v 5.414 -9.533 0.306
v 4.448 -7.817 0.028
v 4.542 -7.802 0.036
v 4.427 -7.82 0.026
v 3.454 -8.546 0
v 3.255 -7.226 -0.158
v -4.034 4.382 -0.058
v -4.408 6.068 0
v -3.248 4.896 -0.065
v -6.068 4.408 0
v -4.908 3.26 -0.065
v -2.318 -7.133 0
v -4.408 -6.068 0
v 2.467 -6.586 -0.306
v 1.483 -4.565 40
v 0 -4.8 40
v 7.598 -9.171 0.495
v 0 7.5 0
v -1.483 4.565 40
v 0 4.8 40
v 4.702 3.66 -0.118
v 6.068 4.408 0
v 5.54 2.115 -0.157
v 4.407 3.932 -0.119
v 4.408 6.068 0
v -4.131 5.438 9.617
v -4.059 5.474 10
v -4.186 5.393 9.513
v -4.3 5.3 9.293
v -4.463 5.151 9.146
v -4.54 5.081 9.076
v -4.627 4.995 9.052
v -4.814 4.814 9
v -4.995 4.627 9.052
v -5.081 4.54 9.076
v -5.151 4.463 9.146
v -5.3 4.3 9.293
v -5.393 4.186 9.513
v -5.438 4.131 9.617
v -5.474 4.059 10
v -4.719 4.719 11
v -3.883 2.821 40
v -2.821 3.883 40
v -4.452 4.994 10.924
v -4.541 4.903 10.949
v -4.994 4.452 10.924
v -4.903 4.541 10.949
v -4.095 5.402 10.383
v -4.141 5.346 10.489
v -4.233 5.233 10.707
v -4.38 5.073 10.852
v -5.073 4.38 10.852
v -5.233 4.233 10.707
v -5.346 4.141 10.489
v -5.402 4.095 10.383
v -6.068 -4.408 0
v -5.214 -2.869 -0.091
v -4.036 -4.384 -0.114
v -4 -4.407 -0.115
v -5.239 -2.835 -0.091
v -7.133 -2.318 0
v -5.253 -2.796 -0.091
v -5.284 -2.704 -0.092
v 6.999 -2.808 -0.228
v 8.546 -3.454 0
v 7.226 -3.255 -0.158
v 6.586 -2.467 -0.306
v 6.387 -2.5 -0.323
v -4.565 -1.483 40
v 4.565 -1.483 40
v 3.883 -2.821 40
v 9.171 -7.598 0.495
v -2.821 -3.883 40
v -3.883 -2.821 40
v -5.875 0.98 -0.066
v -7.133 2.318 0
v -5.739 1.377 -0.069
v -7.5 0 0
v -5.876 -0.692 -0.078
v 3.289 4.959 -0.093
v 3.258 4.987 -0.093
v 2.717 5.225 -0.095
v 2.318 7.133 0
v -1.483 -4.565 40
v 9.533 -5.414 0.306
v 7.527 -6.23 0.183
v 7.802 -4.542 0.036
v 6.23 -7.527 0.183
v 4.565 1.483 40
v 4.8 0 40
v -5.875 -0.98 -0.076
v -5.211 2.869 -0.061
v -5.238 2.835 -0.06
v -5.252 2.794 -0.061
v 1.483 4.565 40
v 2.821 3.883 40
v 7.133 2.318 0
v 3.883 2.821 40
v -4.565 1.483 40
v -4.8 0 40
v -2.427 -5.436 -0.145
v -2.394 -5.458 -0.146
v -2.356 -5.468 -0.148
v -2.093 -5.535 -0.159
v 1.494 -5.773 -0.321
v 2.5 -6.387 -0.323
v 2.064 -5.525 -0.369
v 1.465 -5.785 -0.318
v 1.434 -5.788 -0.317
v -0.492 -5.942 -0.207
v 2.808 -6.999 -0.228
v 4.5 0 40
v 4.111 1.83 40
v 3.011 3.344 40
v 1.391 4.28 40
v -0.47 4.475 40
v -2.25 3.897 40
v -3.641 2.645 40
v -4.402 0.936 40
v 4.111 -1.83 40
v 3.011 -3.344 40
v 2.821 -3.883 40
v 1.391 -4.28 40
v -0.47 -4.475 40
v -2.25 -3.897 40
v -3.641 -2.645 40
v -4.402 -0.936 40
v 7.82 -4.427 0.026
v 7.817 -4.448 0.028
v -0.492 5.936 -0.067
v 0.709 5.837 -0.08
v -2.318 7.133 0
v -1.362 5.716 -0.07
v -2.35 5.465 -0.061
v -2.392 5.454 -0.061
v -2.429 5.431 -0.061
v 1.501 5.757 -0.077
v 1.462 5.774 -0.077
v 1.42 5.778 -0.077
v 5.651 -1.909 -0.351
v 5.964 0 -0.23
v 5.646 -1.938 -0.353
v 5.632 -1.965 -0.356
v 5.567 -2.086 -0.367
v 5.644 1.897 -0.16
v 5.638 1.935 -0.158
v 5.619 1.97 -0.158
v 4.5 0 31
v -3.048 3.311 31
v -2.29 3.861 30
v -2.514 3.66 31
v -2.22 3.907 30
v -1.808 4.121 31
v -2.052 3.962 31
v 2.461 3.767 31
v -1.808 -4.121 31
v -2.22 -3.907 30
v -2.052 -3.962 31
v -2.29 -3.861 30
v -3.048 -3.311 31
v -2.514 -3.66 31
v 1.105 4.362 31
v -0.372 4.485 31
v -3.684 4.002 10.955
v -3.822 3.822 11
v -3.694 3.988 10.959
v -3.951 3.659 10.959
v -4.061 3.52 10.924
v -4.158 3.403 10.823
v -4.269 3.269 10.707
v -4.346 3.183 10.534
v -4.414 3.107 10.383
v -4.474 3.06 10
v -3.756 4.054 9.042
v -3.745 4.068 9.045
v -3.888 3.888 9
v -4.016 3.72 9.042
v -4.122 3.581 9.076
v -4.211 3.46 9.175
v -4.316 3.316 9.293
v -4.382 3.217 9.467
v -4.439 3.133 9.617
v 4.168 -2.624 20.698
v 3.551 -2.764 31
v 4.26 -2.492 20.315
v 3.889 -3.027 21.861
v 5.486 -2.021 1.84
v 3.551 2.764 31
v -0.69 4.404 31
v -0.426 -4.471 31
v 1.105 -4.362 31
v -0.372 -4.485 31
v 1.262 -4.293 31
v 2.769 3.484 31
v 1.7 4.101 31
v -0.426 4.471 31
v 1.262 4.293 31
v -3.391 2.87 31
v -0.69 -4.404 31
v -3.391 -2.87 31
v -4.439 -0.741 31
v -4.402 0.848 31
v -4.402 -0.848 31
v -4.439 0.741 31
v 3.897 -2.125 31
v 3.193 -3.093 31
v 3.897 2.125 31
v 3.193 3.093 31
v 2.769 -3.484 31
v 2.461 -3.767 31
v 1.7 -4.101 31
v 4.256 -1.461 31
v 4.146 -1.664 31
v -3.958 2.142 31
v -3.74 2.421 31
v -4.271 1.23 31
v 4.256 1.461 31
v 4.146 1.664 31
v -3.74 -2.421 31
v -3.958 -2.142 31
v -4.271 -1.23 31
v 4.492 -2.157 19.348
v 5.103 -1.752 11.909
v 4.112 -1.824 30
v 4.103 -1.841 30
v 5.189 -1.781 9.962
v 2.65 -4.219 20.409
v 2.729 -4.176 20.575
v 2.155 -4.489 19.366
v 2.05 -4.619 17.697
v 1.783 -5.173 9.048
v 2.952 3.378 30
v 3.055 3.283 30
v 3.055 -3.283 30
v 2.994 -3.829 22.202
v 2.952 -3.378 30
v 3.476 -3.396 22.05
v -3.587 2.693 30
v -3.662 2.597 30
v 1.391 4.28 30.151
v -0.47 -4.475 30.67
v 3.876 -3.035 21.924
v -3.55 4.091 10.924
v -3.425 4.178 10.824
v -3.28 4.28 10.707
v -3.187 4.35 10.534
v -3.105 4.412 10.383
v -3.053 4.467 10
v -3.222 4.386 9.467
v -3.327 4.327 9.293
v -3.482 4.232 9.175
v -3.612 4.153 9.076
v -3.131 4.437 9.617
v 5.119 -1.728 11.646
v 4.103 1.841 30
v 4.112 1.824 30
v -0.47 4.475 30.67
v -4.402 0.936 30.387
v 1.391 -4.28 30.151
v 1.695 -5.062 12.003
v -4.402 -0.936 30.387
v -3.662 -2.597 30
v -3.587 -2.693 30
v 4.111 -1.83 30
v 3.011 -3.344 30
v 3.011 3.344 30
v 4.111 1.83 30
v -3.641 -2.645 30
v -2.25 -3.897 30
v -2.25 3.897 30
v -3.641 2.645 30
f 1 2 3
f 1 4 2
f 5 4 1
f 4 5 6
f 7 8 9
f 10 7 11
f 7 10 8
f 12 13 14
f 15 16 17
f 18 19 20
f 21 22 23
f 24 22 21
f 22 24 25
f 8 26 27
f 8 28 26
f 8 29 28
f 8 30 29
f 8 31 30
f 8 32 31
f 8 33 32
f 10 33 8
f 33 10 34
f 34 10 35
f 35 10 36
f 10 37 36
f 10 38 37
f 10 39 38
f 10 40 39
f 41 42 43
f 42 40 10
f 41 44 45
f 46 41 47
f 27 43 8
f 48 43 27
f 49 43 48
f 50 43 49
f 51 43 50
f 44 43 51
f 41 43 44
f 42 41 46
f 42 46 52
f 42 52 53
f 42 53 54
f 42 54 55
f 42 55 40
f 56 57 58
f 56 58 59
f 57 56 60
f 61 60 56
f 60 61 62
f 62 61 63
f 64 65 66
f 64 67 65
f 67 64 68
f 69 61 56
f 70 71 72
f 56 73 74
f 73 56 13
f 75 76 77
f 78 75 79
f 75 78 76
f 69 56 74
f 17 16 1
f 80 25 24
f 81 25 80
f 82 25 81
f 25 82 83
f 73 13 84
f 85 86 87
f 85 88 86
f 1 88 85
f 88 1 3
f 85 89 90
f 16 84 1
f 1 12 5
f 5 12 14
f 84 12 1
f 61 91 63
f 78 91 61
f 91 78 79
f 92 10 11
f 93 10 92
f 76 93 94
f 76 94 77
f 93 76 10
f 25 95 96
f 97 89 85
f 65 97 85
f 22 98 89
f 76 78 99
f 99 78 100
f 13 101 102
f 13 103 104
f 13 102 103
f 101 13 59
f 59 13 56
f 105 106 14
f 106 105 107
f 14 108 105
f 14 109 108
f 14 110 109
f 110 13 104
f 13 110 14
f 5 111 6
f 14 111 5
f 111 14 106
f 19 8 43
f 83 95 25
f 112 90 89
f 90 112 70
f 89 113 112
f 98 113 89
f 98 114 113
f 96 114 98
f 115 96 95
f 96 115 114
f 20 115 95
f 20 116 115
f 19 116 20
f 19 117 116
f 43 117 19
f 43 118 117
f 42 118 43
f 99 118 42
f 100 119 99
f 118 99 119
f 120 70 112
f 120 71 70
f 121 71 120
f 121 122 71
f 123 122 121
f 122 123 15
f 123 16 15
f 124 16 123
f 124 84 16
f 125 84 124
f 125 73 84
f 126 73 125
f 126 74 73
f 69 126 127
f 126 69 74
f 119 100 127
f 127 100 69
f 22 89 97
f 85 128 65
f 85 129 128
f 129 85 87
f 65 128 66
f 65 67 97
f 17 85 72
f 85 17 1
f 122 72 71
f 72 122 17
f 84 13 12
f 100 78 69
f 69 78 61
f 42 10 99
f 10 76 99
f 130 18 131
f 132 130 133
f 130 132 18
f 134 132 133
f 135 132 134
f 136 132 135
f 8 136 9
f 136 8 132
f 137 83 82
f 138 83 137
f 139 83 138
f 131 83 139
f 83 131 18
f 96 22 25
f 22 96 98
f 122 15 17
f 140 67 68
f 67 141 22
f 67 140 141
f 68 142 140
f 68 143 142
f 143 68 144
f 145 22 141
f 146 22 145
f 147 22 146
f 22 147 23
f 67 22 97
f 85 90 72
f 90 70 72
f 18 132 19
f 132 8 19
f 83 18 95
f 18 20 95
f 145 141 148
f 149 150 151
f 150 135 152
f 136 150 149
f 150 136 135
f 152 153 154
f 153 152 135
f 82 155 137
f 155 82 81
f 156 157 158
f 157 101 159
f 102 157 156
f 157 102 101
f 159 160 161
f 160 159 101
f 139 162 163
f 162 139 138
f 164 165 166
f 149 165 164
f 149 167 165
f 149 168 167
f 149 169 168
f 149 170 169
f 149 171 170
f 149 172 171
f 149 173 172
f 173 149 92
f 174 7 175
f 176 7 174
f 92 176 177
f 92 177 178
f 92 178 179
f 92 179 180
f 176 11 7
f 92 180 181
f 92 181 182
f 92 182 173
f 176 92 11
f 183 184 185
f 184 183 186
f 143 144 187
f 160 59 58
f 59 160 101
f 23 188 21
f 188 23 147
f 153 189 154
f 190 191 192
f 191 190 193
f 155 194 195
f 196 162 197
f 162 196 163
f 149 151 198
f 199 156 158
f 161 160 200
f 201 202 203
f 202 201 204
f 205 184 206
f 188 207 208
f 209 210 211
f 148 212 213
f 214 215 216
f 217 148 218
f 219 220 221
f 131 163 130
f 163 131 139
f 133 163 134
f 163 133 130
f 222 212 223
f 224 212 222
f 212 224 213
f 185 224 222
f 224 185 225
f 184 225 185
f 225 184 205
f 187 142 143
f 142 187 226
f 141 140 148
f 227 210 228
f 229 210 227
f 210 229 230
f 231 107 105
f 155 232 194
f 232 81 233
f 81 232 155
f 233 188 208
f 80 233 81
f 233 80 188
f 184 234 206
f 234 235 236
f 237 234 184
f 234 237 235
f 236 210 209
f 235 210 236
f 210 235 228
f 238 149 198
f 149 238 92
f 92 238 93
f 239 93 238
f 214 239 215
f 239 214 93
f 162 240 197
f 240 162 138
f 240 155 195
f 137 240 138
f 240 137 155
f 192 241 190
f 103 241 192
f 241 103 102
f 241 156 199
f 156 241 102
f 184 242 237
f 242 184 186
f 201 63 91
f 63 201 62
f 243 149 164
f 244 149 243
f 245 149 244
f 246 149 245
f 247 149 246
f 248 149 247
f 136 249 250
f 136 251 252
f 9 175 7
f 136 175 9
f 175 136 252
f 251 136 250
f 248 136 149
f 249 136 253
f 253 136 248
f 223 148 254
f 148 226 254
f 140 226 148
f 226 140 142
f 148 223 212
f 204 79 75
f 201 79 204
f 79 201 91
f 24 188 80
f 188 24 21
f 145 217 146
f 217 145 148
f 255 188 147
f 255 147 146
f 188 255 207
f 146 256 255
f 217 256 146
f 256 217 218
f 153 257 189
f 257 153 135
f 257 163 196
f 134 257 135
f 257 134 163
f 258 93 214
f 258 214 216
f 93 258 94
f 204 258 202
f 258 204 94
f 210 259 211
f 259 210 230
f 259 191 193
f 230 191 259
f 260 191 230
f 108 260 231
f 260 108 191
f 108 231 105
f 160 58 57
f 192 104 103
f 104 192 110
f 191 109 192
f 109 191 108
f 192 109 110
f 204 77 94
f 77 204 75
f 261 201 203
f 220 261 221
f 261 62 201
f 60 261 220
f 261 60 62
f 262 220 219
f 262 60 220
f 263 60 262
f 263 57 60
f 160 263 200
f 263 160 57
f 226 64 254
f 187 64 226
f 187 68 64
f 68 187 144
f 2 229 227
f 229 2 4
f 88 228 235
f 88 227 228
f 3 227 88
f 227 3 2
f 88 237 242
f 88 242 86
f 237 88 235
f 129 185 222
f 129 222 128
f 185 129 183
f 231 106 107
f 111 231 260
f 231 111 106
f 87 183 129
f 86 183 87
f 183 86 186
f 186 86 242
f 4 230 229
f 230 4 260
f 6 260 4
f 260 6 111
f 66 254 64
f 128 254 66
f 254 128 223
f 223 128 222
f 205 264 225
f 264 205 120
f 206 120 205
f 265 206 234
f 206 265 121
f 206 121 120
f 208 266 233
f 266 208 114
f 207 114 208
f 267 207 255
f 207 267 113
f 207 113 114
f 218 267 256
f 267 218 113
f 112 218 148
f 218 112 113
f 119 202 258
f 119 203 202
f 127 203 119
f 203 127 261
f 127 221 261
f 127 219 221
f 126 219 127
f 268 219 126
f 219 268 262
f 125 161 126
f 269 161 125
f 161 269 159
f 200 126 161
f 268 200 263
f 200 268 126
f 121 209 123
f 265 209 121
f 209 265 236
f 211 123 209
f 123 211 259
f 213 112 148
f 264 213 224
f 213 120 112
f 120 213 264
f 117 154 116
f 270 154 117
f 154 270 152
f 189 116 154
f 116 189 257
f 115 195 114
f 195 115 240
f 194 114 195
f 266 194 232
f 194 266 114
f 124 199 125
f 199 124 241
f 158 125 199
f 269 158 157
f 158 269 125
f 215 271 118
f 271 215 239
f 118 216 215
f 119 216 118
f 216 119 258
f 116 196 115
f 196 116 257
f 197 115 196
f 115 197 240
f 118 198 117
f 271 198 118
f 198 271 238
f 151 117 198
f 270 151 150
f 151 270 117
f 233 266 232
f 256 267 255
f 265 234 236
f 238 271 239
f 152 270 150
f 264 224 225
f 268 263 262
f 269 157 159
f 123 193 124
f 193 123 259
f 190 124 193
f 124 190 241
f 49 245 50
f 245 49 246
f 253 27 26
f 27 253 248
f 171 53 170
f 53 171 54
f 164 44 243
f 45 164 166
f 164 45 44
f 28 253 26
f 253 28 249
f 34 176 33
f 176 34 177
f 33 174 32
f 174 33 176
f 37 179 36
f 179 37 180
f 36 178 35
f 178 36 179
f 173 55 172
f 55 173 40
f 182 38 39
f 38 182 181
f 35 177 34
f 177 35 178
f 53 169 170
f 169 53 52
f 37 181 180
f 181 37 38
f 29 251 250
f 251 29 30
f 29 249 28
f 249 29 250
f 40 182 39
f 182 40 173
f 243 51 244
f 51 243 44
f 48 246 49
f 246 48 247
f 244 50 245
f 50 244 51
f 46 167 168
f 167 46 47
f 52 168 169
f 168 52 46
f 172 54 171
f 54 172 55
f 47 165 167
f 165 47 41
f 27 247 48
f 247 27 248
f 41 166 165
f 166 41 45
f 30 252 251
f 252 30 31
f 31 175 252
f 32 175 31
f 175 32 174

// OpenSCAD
module cubrecable(){
difference(){
hull(){
scale([1.2,1.2,1]){
translate([0,0,0])cylinder(r1=12.5/2,r2=8/2,h=40);
translate([5,-5,0])rotate([-10,0,45])cylinder(r1=6/2,r2=4/2,h=40);
}
}
translate([0,0,-1])cylinder(r1=12/2,r2=9/2,h=32);
translate([5,-5,-1])rotate([-10,0,45])cylinder(r1=6/2,r2=3/2,h=32);
translate([0,0,30])cylinder(r=9/2,h=32);
translate([0,0,10])rotate([-90,0,45])cylinder(r=1,h=10,$fn=16);
}

}

cubrecable();
